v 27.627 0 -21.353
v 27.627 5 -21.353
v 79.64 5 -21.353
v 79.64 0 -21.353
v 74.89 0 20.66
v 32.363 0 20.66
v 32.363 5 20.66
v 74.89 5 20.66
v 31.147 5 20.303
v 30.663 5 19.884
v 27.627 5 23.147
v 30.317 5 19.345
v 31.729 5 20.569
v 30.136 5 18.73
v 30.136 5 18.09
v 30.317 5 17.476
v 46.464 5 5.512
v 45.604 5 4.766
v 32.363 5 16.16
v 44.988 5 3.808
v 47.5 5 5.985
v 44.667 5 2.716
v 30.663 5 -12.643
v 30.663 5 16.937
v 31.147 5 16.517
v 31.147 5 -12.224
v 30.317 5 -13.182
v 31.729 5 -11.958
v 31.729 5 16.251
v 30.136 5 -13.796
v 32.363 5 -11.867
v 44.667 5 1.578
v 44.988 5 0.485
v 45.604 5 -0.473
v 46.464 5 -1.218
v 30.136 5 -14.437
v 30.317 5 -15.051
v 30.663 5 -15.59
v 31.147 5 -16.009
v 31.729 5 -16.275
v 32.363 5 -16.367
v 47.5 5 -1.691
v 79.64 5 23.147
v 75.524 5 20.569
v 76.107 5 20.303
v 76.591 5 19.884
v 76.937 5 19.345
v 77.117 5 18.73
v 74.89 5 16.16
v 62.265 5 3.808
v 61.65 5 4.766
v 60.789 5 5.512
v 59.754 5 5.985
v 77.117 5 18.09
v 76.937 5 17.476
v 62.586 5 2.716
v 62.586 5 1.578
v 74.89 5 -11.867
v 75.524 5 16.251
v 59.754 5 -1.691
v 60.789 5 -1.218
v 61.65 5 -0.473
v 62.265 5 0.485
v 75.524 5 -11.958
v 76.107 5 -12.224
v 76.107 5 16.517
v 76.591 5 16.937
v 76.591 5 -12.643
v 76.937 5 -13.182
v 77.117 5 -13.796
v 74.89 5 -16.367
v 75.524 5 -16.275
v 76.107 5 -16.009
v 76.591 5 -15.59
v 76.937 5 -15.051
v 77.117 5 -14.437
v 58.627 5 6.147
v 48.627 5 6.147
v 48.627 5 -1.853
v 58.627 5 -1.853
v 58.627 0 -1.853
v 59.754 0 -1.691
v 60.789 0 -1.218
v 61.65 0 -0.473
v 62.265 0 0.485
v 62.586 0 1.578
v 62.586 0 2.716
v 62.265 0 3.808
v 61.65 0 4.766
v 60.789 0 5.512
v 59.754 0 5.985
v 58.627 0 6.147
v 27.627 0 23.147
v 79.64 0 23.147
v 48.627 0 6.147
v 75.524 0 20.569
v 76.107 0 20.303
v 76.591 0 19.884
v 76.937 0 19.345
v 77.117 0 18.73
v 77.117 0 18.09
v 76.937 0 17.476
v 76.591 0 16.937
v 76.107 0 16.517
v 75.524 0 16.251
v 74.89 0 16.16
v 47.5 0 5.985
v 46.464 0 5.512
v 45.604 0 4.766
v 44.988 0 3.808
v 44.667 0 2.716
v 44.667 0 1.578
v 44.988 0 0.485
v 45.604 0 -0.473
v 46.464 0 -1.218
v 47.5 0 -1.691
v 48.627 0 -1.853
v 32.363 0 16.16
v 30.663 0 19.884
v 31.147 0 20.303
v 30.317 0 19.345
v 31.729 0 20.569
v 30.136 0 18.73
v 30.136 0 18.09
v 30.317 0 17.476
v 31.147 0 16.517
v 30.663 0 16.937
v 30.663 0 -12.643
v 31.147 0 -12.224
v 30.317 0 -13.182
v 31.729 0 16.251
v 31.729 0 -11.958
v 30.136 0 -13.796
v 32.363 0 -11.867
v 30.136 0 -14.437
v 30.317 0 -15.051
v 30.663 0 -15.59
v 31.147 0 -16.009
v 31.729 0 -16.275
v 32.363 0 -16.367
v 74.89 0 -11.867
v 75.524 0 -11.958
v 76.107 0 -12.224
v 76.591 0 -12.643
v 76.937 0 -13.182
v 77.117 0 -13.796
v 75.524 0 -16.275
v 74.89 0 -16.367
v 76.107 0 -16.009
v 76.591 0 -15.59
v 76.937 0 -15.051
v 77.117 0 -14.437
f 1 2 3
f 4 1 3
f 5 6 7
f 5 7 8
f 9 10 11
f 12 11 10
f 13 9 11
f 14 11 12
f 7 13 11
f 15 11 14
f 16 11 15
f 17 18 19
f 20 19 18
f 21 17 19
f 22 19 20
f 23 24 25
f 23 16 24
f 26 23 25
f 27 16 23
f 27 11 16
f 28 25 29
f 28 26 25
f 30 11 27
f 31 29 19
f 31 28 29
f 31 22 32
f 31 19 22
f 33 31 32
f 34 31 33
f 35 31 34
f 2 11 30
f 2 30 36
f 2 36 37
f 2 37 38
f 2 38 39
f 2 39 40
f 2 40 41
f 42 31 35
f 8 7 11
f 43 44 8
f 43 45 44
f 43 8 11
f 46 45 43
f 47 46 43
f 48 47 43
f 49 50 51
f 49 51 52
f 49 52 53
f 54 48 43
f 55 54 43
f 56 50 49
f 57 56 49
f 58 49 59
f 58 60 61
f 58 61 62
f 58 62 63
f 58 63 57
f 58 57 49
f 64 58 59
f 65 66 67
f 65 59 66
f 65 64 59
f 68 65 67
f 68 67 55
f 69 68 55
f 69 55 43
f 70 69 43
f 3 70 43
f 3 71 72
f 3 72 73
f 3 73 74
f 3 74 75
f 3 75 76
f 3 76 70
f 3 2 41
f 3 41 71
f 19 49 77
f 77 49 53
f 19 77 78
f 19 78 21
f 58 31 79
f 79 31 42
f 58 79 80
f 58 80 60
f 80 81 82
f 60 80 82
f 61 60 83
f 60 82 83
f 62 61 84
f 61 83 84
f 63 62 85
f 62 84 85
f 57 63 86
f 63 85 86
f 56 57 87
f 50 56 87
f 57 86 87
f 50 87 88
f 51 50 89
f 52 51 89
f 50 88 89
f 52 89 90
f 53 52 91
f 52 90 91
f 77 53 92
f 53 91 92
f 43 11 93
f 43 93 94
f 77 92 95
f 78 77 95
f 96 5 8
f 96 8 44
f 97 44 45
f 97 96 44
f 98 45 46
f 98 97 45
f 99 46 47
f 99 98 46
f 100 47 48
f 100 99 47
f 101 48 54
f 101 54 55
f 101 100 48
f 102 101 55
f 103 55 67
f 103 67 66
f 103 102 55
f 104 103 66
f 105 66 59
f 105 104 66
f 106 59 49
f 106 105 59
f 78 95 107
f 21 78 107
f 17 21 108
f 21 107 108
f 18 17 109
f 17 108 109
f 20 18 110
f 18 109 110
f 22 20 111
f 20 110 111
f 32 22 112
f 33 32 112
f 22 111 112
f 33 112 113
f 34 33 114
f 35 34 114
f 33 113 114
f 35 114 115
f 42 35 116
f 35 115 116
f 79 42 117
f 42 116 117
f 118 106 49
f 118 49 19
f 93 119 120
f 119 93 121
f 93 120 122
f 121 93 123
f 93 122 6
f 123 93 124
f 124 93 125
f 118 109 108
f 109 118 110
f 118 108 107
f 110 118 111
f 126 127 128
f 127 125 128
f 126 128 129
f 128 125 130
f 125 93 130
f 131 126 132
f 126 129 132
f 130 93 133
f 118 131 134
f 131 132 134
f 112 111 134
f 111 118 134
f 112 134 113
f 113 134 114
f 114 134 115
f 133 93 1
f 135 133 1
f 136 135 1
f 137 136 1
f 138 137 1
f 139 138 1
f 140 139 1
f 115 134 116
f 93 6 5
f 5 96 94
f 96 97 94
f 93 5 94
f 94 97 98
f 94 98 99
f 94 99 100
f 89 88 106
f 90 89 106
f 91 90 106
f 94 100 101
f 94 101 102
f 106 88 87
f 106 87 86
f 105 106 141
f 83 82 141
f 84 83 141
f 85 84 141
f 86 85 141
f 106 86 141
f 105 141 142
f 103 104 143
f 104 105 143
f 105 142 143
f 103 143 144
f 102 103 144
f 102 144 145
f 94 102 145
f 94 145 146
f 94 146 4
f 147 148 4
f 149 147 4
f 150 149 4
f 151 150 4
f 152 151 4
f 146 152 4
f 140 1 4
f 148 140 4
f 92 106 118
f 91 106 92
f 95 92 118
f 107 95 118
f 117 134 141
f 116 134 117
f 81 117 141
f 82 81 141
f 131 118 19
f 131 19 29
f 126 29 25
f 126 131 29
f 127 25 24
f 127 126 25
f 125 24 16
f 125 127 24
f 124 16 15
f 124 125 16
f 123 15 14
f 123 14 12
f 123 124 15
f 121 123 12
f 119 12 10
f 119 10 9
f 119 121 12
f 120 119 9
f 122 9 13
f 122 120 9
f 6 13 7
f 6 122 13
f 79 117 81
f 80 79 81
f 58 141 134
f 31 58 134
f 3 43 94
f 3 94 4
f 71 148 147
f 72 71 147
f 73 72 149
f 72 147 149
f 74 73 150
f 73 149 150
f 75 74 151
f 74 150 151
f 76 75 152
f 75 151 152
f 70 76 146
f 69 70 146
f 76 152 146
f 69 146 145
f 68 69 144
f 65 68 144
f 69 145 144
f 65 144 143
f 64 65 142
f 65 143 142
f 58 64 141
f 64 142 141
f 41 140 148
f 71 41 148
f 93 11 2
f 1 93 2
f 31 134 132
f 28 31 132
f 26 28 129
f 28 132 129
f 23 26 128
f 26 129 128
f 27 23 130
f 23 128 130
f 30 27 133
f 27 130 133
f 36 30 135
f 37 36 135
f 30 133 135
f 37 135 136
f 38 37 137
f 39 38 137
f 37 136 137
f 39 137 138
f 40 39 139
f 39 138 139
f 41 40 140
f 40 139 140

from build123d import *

# Parameters (mm, degrees)
SKETCH1_R           = 4
BOSS_EXTRUDE1_DEPTH = 5
CUT_EXTRUDE1_DEPTH  = 10
CUT_EXTRUDE2_DEPTH  = 10
CUT_EXTRUDE5_START  = -75
SKETCH5_R           = 1.6
CUT_EXTRUDE5_DEPTH  = 10
SKETCH6_W           = 85
SKETCH6_H           = 75
CUT_EXTRUDE6_DEPTH  = 10
SKETCH7_W           = 65
SKETCH7_H           = 15
CUT_EXTRUDE7_DEPTH  = 10
SKETCH8_W           = 12.986544032
SKETCH8_H           = 50
CUT_EXTRUDE8_DEPTH  = 10
SKETCH9_W           = 52.013455968
SKETCH9_H           = 5.5
CUT_EXTRUDE9_DEPTH  = 10


with BuildPart() as part:
    # Sketch1 → Boss-Extrude1 (new body)
    with BuildSketch(Plane(origin=(0, 0, 0), x_dir=(1, 0, 0), z_dir=(0, 1, 0))):
        with BuildLine():
            Line((-57.373232891, 17.353168425), (-57.373232891, -35.646831575))
            Line((-57.373232891, -35.646831575), (-57.373232891, -43.646831575))
            Line((-57.373232891, -43.646831575), (92.626767109, -43.646831575))
            Line((92.626767109, -43.646831575), (92.626767109, -35.646831575))
            Line((92.626767109, -35.646831575), (92.626767109, 29.353168425))
            ThreePointArc((92.626767109, 29.353168425), (92.040980672, 30.767381987), (90.626767109, 31.353168425))
            Line((90.626767109, 31.353168425), (26.626767109, 31.353168425))
            Line((26.626767109, 31.353168425), (-57.373232891, 31.353168425))
            Line((-57.373232891, 31.353168425), (-57.373232891, 17.353168425))
        make_face()
        with Locations((-25.373232891, -2.646831575)):
            Circle(SKETCH1_R, mode=Mode.SUBTRACT)
        with BuildLine():
            Line((32.363311142, 16.366624392), (74.890223077, 16.366624392))
            ThreePointArc((74.890223077, 16.366624392), (77.140223077, 14.116624392), (74.890223077, 11.866624392))
            Line((74.890223077, 11.866624392), (32.363311142, 11.866624392))
            ThreePointArc((32.363311142, 11.866624392), (30.113311142, 14.116624392), (32.363311142, 16.366624392))
        make_face(mode=Mode.SUBTRACT)
        with BuildLine():
            Line((32.363311142, -20.660287542), (74.890223077, -20.660287542))
            ThreePointArc((74.890223077, -20.660287542), (77.140223077, -18.410287542), (74.890223077, -16.160287542))
            Line((74.890223077, -16.160287542), (32.363311142, -16.160287542))
            ThreePointArc((32.363311142, -16.160287542), (30.113311142, -18.410287542), (32.363311142, -20.660287542))
        make_face(mode=Mode.SUBTRACT)
        with BuildLine():
            Line((48.626767109, 1.853168425), (58.626767109, 1.853168425))
            ThreePointArc((58.626767109, 1.853168425), (62.626767109, -2.146831575), (58.626767109, -6.146831575))
            Line((58.626767109, -6.146831575), (48.626767109, -6.146831575))
            ThreePointArc((48.626767109, -6.146831575), (44.626767109, -2.146831575), (48.626767109, 1.853168425))
        make_face(mode=Mode.SUBTRACT)
    extrude(amount=BOSS_EXTRUDE1_DEPTH)

    # Sketch2 → Cut-Extrude1 (cut)
    with BuildSketch(Plane(origin=(0, 5, 0), x_dir=(1, 0, 0), z_dir=(0, 1, 0))):
        with BuildLine():
            Line((-47.394048171, 11.623983705), (-13.35241761, 11.623983705))
            ThreePointArc((-13.35241761, 11.623983705), (-11.10241761, 9.373983705), (-13.35241761, 7.123983705))
            Line((-13.35241761, 7.123983705), (-47.394048171, 7.123983705))
            ThreePointArc((-47.394048171, 7.123983705), (-49.644048171, 9.373983705), (-47.394048171, 11.623983705))
        make_face()
        with BuildLine():
            Line((-47.394048171, -16.917646855), (-13.35241761, -16.917646855))
            ThreePointArc((-13.35241761, -16.917646855), (-11.10241761, -14.667646855), (-13.35241761, -12.417646855))
            Line((-13.35241761, -12.417646855), (-47.394048171, -12.417646855))
            ThreePointArc((-47.394048171, -12.417646855), (-49.644048171, -14.667646855), (-47.394048171, -16.917646855))
        make_face()
        with BuildLine():
            Line((-35.373232891, 1.353168425), (-25.373232891, 1.353168425))
            ThreePointArc((-25.373232891, 1.353168425), (-21.373232891, -2.646831575), (-25.373232891, -6.646831575))
            Line((-25.373232891, -6.646831575), (-35.373232891, -6.646831575))
            ThreePointArc((-35.373232891, -6.646831575), (-39.373232891, -2.646831575), (-35.373232891, 1.353168425))
        make_face()
    extrude(amount=-CUT_EXTRUDE1_DEPTH, mode=Mode.SUBTRACT)

    # Sketch3 → Cut-Extrude2 (cut)
    with BuildSketch(Plane(origin=(0, 5, 0), x_dir=(1, 0, 0), z_dir=(0, 1, 0))):
        with BuildLine():
            Line((21.749403979, 13.353168425), (21.749403979, 3.353168425))
            ThreePointArc((21.749403979, 3.353168425), (17.749403979, -0.646831575), (13.749403979, 3.353168425))
            Line((13.749403979, 3.353168425), (13.749403979, 13.353168425))
            ThreePointArc((13.749403979, 13.353168425), (17.749403979, 17.353168425), (21.749403979, 13.353168425))
        make_face()
        with BuildLine():
            Line((21.749403979, -14.646831575), (21.749403979, -24.646831575))
            ThreePointArc((21.749403979, -24.646831575), (17.749403979, -28.646831575), (13.749403979, -24.646831575))
            Line((13.749403979, -24.646831575), (13.749403979, -14.646831575))
            ThreePointArc((13.749403979, -14.646831575), (17.749403979, -10.646831575), (21.749403979, -14.646831575))
        make_face()
    extrude(amount=-CUT_EXTRUDE2_DEPTH, mode=Mode.SUBTRACT)

    # Sketch5 → Cut-Extrude5 (cut)
    with BuildSketch(Plane.XY.offset(43.646831575).offset(CUT_EXTRUDE5_START)):
        with Locations((-47.373232891, 2.5)):
            Circle(SKETCH5_R)
        with Locations((82.626767109, 2.5)):
            Circle(SKETCH5_R)
    extrude(amount=CUT_EXTRUDE5_DEPTH, mode=Mode.SUBTRACT)

    # Sketch6 → Cut-Extrude6 (cut)
    with BuildSketch(Plane(origin=(0, 5, 0), x_dir=(1, 0, 0), z_dir=(0, 1, 0))):
        with Locations((-14.873232891, -6.146831575)):
            Rectangle(SKETCH6_W, SKETCH6_H)
    extrude(amount=-CUT_EXTRUDE6_DEPTH, mode=Mode.SUBTRACT)

    # Sketch7 → Cut-Extrude7 (cut)
    with BuildSketch(Plane(origin=(0, 5, 0), x_dir=(1, 0, 0), z_dir=(0, 1, 0))):
        with Locations((60.126767109, -36.146831575)):
            Rectangle(SKETCH7_W, SKETCH7_H)
    extrude(amount=-CUT_EXTRUDE7_DEPTH, mode=Mode.SUBTRACT)

    # Sketch8 → Cut-Extrude8 (cut)
    with BuildSketch(Plane(origin=(0, 5, 0), x_dir=(1, 0, 0), z_dir=(0, 1, 0))):
        with BuildLine():
            Line((90.626767109, 31.353168425), (27.626767109, 31.353168425))
            Line((27.626767109, 31.353168425), (27.626767109, 21.353168425))
            Line((27.626767109, 21.353168425), (79.640223077, 21.353168425))
            Line((79.640223077, 21.353168425), (92.626767109, 21.353168425))
            Line((92.626767109, 21.353168425), (92.626767109, 29.353168425))
            ThreePointArc((92.626767109, 29.353168425), (92.040980672, 30.767381987), (90.626767109, 31.353168425))
        make_face()
        with Locations((86.133495093, -3.646831575)):
            Rectangle(SKETCH8_W, SKETCH8_H)
    extrude(amount=-CUT_EXTRUDE8_DEPTH, mode=Mode.SUBTRACT)

    # Sketch9 → Cut-Extrude9 (cut)
    with BuildSketch(Plane(origin=(0, 5, 0), x_dir=(1, 0, 0), z_dir=(0, 1, 0))):
        with Locations((53.633495093, -25.896831575)):
            Rectangle(SKETCH9_W, SKETCH9_H)
    extrude(amount=-CUT_EXTRUDE9_DEPTH, mode=Mode.SUBTRACT)


solid = part.part
